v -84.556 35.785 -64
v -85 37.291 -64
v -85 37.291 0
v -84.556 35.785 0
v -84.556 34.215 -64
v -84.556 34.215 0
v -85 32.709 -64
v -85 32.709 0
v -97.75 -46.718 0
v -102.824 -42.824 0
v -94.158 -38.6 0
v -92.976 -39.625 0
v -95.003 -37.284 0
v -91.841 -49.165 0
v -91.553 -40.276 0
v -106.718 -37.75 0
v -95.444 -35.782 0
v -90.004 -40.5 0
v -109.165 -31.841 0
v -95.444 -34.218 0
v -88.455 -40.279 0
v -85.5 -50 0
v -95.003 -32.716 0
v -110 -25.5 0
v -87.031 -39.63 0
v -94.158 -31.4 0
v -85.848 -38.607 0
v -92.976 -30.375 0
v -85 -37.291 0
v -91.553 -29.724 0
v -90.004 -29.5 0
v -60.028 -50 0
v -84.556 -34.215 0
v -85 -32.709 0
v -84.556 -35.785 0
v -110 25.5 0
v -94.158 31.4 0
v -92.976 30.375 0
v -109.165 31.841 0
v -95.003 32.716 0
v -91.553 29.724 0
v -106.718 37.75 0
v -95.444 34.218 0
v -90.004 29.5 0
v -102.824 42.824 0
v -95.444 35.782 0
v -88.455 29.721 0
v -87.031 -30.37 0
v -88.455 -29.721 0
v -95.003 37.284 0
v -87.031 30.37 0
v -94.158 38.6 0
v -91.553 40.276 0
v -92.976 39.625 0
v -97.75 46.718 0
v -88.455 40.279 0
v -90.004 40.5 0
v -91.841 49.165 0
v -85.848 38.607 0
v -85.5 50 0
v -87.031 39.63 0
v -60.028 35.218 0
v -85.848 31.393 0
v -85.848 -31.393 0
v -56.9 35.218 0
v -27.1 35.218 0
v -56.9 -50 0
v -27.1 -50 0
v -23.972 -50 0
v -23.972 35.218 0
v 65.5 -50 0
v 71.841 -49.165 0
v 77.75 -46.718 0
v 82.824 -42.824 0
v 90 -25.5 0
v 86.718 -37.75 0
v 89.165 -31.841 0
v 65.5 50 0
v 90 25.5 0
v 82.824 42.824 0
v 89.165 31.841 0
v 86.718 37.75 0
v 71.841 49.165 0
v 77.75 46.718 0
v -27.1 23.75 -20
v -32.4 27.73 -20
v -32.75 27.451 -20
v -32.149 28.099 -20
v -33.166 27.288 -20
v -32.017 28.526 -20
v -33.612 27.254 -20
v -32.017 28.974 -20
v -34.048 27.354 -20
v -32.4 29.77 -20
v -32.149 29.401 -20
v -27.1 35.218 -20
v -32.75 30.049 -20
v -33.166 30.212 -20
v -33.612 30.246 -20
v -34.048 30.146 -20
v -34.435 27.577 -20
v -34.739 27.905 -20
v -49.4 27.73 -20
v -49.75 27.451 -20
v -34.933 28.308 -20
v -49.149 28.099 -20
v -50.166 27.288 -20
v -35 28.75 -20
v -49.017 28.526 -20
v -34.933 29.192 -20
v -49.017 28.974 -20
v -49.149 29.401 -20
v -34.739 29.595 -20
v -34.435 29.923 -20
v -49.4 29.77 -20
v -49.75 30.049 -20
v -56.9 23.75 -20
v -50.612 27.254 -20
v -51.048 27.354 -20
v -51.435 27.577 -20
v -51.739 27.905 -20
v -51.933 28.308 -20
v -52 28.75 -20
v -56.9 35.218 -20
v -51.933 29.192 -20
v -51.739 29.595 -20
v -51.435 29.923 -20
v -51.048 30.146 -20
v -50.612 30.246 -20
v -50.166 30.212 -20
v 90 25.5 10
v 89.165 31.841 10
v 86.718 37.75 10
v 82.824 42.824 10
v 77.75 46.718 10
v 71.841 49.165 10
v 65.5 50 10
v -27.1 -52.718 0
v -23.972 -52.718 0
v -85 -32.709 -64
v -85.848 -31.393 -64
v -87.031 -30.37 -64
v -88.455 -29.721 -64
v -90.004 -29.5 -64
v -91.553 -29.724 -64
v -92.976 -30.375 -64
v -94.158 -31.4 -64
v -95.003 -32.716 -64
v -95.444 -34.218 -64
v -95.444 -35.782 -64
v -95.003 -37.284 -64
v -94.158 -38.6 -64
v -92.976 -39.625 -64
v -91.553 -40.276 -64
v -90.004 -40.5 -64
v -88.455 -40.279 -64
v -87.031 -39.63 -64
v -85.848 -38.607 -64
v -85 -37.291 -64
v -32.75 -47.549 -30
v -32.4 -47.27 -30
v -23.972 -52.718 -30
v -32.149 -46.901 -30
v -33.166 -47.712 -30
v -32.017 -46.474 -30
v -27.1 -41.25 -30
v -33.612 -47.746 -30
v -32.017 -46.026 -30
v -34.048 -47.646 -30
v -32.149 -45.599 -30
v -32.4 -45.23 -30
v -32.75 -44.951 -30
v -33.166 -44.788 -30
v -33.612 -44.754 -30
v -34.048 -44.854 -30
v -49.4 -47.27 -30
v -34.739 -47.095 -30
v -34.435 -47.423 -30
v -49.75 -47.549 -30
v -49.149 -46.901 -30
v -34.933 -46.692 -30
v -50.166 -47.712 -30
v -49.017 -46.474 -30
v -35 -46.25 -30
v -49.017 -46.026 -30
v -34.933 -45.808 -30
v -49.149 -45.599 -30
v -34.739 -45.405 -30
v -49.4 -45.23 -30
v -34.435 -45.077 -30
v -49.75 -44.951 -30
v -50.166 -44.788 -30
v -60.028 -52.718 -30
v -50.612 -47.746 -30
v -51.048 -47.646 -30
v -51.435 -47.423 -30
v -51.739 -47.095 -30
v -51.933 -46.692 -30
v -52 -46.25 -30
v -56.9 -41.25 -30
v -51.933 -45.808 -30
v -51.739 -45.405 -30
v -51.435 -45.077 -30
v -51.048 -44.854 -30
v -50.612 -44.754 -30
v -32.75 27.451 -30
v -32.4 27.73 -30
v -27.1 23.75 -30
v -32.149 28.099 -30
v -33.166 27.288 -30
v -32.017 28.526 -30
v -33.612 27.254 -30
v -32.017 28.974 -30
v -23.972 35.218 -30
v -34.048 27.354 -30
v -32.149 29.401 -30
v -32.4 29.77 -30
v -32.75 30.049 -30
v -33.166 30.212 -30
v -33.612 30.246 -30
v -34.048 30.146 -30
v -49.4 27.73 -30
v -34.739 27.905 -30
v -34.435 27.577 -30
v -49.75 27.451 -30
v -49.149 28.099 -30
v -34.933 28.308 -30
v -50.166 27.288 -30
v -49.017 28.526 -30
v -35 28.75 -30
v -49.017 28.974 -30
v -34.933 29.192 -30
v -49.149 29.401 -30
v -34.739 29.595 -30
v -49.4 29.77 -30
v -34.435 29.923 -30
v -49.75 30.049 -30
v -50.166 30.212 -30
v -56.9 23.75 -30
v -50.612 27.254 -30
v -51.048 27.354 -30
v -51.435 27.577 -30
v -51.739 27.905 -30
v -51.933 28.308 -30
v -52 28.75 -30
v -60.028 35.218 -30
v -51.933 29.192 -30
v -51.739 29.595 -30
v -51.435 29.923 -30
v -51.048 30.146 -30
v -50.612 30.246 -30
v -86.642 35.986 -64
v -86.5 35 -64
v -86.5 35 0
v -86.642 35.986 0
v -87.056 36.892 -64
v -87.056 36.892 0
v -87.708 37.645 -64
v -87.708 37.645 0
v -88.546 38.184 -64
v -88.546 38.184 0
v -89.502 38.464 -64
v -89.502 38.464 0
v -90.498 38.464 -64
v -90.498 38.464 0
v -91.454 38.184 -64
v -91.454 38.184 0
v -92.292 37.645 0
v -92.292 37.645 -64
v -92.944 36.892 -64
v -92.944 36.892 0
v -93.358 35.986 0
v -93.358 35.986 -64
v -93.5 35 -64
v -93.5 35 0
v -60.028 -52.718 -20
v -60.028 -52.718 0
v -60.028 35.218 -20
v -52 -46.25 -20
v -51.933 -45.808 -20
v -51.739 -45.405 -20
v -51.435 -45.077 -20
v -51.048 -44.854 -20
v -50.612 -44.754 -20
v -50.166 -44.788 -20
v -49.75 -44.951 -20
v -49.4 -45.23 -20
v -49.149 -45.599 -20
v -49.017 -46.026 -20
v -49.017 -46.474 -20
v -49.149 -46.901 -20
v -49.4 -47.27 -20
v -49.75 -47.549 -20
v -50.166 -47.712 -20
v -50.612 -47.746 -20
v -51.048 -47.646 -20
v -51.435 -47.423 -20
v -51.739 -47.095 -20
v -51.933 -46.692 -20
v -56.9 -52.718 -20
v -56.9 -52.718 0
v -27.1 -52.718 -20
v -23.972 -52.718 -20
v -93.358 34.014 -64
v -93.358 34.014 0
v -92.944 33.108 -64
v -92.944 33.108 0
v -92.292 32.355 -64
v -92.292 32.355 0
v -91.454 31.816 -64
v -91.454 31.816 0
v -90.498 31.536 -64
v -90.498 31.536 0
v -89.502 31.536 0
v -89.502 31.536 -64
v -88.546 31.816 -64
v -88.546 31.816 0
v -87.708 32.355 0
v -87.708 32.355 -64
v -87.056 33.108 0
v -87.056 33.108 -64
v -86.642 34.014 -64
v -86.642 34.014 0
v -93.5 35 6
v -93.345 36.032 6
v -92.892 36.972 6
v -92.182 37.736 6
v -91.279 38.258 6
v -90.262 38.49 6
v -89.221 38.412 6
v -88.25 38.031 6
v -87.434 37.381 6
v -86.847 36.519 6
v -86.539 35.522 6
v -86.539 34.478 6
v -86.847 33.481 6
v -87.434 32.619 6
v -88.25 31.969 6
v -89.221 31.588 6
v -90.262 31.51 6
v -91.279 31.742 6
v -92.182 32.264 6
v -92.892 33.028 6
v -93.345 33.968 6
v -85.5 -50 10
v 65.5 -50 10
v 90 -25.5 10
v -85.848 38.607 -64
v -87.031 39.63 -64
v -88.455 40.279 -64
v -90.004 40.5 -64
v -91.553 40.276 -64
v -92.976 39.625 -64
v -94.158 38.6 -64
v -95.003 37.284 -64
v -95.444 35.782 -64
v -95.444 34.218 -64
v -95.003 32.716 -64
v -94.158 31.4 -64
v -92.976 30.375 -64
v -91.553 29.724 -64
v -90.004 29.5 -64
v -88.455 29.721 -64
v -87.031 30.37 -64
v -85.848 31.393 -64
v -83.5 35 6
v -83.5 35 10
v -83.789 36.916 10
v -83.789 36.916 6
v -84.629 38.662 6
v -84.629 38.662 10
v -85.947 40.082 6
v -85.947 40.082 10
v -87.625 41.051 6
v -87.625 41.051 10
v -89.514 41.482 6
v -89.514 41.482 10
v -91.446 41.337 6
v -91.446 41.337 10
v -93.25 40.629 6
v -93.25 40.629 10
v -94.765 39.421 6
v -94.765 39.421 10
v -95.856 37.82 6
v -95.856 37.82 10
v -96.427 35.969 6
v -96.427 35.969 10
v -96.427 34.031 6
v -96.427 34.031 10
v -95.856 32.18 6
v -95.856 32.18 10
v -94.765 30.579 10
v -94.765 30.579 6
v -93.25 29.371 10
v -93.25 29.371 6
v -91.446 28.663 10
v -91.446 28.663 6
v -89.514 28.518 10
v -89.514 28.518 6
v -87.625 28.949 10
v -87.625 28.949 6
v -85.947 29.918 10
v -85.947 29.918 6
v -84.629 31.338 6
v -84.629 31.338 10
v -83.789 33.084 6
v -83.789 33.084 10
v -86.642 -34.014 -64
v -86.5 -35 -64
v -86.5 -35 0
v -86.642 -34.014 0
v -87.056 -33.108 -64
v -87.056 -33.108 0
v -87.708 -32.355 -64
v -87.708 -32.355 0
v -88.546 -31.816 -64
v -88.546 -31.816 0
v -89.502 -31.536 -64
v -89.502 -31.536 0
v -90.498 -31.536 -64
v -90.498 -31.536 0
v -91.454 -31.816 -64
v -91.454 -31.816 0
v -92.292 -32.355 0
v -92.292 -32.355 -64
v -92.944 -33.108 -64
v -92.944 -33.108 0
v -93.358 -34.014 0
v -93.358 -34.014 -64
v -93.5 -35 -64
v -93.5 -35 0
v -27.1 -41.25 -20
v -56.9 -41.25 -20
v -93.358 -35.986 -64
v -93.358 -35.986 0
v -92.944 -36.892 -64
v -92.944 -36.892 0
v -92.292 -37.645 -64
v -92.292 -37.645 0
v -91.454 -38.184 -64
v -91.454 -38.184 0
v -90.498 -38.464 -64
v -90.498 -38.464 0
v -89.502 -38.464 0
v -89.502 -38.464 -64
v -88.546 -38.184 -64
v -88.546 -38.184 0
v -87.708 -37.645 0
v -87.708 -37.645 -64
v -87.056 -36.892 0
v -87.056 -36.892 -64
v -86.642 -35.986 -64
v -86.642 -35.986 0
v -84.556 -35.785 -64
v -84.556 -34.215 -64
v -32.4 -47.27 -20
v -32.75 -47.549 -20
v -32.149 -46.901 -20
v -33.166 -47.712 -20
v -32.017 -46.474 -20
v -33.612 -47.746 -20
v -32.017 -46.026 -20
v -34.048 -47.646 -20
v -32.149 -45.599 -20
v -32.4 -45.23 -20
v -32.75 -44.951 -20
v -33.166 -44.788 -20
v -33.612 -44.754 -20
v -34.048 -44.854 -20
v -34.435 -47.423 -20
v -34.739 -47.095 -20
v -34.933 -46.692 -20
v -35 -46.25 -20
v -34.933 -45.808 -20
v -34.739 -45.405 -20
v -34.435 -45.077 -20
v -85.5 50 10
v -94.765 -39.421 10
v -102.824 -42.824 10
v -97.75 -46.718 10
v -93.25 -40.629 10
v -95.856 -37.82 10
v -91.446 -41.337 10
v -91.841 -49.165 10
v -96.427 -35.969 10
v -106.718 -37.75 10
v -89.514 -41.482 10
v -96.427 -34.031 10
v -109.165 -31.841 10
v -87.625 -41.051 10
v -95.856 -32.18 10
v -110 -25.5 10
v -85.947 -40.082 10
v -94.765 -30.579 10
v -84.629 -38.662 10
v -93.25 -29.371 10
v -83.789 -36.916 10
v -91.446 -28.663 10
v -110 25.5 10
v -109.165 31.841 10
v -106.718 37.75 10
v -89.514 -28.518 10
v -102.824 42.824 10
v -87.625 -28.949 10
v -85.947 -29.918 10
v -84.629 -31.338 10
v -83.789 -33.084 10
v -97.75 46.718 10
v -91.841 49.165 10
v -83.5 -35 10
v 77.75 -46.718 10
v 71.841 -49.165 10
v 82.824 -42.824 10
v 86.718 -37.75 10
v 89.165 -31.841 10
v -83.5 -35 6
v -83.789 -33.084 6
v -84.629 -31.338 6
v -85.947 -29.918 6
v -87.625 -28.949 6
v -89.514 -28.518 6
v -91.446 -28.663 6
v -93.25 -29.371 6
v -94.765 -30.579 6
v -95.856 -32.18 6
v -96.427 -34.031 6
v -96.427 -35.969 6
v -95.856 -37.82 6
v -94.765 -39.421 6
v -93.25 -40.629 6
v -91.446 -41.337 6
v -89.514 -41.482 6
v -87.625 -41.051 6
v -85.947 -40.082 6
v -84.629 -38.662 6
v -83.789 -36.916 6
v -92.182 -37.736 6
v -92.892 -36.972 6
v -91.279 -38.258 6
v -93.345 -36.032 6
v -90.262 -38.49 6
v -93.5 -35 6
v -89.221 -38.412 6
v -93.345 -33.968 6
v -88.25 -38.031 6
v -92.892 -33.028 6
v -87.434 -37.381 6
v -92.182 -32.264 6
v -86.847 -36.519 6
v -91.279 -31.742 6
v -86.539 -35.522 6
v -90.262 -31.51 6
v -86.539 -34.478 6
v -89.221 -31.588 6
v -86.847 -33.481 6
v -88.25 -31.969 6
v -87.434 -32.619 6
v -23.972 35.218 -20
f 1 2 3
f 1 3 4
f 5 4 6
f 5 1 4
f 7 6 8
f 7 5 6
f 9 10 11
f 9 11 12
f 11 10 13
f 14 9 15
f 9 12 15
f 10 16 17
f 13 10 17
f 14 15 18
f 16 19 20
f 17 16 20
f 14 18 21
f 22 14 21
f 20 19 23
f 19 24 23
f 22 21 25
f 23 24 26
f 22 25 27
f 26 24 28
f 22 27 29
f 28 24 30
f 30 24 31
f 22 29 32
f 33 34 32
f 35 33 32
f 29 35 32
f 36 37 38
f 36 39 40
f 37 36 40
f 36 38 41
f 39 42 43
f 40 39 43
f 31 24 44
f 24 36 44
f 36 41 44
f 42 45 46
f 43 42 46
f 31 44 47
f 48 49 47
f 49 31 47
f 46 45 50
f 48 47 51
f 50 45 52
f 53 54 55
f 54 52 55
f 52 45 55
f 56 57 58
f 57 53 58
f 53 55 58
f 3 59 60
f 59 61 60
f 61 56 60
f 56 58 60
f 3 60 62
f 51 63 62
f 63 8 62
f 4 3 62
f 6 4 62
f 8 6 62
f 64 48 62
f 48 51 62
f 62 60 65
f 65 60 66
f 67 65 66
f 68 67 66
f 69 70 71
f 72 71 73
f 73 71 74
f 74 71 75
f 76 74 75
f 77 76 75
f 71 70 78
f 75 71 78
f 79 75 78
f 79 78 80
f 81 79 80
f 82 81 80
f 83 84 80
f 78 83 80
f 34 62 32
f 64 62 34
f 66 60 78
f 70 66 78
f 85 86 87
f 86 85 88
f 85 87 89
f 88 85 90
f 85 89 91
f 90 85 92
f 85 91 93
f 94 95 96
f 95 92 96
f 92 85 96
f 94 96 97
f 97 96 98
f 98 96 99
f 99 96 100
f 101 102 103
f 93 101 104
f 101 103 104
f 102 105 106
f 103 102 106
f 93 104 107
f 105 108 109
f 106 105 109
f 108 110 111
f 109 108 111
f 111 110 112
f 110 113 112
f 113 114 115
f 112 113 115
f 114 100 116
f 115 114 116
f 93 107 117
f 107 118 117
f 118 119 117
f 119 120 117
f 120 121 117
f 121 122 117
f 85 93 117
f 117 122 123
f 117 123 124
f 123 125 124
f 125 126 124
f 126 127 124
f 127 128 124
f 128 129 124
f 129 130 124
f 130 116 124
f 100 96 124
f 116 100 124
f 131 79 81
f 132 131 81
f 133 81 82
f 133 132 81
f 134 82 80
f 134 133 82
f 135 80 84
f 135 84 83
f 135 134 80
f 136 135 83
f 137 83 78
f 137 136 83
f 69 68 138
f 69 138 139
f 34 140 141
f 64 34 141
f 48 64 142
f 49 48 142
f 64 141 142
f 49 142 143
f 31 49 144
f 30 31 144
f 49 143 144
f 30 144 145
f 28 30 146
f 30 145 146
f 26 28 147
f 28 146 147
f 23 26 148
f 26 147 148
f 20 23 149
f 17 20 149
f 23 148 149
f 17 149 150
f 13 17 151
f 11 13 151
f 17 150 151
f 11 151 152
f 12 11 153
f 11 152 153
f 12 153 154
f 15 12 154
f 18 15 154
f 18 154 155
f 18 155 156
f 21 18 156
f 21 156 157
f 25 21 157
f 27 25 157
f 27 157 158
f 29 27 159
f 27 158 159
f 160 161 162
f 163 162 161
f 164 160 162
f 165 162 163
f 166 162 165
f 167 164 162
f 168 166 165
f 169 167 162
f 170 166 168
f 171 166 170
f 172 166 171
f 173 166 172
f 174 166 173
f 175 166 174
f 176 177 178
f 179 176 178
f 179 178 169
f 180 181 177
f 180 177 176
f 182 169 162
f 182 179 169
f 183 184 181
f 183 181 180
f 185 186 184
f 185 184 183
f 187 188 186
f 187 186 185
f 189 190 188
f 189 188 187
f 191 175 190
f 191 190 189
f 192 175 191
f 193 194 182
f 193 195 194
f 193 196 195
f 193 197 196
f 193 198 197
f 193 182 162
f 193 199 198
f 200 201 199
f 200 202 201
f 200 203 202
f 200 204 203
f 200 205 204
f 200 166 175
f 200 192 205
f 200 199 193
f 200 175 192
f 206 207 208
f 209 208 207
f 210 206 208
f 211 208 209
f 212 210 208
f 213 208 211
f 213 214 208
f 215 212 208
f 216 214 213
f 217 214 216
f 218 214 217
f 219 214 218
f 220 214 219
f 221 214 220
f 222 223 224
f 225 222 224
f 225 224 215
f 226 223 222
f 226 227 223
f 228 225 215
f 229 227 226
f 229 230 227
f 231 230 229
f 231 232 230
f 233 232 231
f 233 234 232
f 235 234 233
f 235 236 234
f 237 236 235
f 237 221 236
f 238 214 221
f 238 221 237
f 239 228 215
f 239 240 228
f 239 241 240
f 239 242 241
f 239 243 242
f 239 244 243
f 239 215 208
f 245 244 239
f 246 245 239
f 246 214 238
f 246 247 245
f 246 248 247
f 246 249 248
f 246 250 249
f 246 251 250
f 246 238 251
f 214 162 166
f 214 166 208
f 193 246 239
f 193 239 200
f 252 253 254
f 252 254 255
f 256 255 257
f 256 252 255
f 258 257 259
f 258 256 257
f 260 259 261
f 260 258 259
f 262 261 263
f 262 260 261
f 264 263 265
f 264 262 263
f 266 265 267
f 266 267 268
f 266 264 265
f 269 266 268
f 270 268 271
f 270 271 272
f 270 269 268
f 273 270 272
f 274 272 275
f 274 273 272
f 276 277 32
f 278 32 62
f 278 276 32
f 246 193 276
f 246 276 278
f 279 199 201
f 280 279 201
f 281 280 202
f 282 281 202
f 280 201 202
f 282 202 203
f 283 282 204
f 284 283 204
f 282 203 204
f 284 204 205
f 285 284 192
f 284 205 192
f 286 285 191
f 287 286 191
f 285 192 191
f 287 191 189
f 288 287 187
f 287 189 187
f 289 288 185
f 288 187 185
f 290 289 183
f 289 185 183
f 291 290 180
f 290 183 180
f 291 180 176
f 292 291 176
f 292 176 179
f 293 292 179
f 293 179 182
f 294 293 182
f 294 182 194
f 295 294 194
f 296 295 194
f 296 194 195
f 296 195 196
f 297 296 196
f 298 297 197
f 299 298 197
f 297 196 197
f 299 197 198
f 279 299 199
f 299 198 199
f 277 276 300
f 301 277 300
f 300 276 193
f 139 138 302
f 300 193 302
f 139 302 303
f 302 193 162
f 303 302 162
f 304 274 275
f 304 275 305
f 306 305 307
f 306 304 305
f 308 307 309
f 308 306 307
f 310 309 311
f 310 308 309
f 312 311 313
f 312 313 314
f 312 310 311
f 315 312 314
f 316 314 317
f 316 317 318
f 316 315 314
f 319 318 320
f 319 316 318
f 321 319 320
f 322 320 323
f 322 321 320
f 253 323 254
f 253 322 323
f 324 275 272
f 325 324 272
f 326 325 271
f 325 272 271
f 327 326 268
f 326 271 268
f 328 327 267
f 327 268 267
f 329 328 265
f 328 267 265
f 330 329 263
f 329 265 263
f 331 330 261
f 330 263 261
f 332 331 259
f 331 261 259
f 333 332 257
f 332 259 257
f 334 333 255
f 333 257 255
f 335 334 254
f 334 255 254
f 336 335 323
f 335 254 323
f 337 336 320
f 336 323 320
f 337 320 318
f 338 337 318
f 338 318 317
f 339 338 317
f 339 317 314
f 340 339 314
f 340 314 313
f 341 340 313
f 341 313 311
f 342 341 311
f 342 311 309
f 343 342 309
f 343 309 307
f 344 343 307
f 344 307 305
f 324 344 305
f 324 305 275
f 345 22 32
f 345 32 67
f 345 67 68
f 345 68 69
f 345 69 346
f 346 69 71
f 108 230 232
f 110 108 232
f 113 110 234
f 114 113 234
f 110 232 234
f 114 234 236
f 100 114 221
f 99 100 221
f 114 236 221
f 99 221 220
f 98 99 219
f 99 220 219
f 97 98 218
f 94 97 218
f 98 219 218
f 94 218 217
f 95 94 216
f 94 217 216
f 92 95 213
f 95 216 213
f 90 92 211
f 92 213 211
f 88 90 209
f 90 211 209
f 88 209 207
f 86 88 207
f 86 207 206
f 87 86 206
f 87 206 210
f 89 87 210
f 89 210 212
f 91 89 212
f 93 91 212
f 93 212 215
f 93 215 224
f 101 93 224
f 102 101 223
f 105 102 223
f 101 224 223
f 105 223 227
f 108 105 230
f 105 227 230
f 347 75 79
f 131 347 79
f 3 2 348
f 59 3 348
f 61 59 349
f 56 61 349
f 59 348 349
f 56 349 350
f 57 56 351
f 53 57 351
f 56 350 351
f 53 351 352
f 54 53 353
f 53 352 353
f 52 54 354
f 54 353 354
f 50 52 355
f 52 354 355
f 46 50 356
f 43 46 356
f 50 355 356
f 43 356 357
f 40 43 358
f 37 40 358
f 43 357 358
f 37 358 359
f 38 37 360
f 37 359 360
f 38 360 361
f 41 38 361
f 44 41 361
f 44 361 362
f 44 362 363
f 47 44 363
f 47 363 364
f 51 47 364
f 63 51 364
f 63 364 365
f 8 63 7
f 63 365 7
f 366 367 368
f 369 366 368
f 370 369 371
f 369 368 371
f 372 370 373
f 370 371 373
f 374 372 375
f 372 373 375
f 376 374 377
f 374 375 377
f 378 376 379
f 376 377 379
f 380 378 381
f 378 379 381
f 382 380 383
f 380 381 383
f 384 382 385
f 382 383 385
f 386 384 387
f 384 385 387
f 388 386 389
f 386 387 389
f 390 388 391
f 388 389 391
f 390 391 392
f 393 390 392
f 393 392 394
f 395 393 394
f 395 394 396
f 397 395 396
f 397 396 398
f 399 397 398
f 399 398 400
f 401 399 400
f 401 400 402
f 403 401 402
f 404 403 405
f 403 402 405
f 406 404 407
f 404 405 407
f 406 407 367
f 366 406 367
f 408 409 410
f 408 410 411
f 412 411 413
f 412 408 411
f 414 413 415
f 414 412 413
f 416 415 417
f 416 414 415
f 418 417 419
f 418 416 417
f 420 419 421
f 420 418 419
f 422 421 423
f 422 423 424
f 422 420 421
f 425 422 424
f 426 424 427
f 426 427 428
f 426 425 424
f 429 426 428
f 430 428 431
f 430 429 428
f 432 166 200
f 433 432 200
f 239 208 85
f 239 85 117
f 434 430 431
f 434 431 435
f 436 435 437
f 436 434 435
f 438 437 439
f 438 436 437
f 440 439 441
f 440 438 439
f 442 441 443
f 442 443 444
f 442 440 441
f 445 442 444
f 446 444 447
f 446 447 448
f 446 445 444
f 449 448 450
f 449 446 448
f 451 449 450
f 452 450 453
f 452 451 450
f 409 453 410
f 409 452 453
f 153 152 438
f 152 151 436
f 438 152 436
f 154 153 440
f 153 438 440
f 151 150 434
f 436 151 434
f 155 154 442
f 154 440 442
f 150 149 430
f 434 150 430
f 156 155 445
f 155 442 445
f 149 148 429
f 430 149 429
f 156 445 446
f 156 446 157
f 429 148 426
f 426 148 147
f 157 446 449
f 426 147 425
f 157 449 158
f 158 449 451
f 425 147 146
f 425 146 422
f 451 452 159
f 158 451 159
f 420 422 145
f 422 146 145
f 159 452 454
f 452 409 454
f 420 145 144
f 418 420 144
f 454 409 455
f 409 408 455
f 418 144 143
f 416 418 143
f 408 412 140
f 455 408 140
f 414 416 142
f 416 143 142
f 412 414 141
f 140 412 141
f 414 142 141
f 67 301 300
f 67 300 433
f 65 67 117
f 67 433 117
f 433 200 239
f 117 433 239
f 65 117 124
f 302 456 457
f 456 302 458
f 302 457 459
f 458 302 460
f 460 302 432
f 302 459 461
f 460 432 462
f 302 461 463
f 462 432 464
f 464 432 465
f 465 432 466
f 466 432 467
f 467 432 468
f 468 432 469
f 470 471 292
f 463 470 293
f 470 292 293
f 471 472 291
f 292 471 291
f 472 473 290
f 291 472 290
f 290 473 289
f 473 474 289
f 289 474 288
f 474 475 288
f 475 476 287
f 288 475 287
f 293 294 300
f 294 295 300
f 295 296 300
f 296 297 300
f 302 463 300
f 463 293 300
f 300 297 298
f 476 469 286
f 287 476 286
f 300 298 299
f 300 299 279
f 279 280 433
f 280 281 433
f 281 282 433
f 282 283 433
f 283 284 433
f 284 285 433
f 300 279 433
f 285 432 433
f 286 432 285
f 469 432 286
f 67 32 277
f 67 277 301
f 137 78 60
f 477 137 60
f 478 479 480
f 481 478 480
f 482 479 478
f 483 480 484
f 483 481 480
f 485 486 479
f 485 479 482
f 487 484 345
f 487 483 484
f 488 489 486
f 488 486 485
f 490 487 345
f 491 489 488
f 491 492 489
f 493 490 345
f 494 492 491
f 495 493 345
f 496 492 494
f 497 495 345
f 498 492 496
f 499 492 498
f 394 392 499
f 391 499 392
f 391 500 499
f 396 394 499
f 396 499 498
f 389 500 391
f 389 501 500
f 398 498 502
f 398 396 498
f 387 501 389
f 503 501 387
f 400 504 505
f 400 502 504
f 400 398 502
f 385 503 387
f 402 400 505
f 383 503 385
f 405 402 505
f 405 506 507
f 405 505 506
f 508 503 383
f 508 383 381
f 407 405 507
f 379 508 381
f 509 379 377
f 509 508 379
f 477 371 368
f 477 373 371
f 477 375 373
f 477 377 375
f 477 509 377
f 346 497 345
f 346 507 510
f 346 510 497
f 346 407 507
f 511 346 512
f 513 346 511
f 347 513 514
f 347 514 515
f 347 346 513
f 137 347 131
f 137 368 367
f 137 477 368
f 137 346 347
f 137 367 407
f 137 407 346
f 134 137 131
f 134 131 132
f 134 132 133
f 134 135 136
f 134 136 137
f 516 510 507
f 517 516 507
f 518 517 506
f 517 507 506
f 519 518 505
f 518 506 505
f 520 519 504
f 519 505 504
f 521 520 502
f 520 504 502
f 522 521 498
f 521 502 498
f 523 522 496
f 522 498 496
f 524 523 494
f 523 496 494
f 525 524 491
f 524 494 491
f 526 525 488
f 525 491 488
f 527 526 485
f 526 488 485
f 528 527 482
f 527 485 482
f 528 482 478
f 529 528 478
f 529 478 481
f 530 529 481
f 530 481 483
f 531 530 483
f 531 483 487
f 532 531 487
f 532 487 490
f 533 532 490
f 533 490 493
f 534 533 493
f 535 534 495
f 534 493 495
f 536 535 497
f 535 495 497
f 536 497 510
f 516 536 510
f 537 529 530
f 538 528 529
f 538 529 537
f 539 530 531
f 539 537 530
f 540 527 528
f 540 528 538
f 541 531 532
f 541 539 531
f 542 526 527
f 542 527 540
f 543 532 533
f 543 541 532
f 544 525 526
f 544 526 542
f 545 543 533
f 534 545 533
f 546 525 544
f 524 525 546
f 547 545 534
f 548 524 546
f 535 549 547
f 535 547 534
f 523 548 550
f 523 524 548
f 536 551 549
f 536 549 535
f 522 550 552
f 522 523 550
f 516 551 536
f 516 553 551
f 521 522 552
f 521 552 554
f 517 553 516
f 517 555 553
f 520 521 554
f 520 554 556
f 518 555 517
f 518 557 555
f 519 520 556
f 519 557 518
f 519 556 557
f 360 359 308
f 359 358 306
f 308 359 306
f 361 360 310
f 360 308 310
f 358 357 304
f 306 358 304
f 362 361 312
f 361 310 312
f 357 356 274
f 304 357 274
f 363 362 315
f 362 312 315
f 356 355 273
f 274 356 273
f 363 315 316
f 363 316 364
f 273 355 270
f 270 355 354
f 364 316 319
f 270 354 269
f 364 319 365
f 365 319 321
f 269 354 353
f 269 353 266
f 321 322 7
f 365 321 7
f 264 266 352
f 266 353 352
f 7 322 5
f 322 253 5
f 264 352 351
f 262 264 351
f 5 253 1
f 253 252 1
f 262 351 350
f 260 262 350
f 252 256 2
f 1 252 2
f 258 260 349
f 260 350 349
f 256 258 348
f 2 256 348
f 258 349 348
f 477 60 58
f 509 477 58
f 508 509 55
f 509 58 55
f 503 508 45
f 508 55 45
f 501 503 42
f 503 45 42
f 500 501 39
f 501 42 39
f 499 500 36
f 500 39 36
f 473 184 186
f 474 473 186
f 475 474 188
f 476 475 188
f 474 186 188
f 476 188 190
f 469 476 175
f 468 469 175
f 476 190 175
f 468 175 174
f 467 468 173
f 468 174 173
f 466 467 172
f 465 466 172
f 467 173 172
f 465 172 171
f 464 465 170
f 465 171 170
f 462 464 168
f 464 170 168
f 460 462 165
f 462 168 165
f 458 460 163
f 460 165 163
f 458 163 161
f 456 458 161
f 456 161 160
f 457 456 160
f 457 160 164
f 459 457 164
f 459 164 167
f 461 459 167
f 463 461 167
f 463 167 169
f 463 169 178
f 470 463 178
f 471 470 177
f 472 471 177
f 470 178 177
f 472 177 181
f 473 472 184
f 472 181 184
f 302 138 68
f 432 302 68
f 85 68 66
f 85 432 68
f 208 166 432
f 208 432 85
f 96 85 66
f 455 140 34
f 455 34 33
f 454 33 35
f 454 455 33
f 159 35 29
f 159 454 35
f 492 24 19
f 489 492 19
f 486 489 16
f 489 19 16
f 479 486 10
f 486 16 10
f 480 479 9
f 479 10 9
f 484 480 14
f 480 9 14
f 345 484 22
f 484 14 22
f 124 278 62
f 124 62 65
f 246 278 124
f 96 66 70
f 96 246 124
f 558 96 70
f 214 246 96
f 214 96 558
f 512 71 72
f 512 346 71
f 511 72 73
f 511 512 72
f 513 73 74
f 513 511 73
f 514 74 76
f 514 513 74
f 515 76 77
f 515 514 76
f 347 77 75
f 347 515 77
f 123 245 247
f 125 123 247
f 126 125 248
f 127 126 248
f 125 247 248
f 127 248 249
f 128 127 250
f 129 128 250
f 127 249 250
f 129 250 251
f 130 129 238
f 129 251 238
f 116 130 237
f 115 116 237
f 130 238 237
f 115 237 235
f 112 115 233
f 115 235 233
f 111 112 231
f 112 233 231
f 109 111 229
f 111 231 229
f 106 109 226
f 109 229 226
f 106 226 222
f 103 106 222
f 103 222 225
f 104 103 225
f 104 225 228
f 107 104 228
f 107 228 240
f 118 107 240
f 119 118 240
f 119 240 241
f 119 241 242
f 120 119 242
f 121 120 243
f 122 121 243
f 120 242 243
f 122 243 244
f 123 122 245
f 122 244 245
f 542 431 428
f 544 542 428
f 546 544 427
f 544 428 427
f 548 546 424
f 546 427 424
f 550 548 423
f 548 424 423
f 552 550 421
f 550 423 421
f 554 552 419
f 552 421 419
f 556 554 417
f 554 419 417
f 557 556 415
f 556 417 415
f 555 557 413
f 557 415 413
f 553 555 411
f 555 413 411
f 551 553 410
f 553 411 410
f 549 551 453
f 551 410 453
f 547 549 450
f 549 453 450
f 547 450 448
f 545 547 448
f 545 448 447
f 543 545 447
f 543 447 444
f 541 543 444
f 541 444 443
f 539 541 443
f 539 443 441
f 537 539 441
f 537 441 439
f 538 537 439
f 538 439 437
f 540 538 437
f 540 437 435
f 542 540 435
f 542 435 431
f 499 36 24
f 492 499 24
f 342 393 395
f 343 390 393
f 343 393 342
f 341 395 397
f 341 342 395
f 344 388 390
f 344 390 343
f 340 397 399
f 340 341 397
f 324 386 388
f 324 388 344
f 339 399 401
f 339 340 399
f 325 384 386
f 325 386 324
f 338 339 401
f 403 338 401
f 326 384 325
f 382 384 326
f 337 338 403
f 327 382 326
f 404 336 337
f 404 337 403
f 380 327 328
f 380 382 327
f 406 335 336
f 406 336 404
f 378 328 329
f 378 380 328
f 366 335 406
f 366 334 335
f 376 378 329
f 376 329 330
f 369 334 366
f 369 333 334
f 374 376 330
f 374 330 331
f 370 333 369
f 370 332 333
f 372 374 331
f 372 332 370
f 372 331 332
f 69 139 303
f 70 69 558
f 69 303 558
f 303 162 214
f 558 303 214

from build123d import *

# Parameters (mm, degrees)
SKETCH1_W              = 180
SKETCH1_H              = 100
BOSS_EXTRUDE1_DEPTH    = 10
FILLET1_R              = 24.5
SKETCH5_R              = 5.5
SKETCH5_R_2            = 3.5
BOSS_EXTRUDE4_DEPTH    = 64
MOVE_FACE2_DEPTH       = 10
MOVE_START             = -64
MOVE_FACE3_OUTLINE_R   = 3.5
MOVE_FACE3_DEPTH       = 64
MOVE_FACE3_2_DEPTH     = 10
MOVE_FACE3_3_OUTLINE_R = 3.5
MOVE_FACE3_3_DEPTH     = 64
SKETCH7_R              = 3.5
CUT_EXTRUDE2_DEPTH     = 74
SKETCH8_R              = 6.5
CUT_EXTRUDE3_DEPTH     = 4
SKETCH9_W              = 36.05660051
SKETCH9_H              = 87.936885764
SKETCH9_R              = 1.5
SKETCH9_W_2            = 29.8
SKETCH9_H_2            = 65
BOSS_EXTRUDE6_DEPTH    = 10
SKETCH10_W             = 3.128300255
SKETCH10_H             = 87.936885764
BOSS_EXTRUDE7_DEPTH    = 20


# Read off the part's stored shape, not the designer's step: Move Face2, Move Face3
with BuildPart() as part:
    # Sketch1 → Boss-Extrude1 (new body)
    with BuildSketch(Plane.XY):
        Rectangle(SKETCH1_W, SKETCH1_H)
    extrude(amount=BOSS_EXTRUDE1_DEPTH)

    # Fillet1
    fillet1_edges = [part.edges().sort_by_distance(p)[0] for p in [
        (90, -50, 5),
        (-90, -50, 5),
        (-90, 50, 5),
        (90, 50, 5),
    ]]
    fillet(fillet1_edges, radius=FILLET1_R)

    # Sketch5 → Boss-Extrude4 (add)
    # profile 1 of 2: a face of its own
    with BuildSketch(Plane(origin=(0, 0, 0), x_dir=(-1, 0, 0), z_dir=(0, 0, -1))):
        with Locations((80, 35)):
            Circle(SKETCH5_R)
        with Locations((80, 35)):
            Circle(SKETCH5_R_2, mode=Mode.SUBTRACT)
    # profile 2 of 2: a face of its own
    with BuildSketch(Plane(origin=(0, 0, 0), x_dir=(-1, 0, 0), z_dir=(0, 0, -1))):
        with Locations((80, -35)):
            Circle(SKETCH5_R)
        with Locations((80, -35)):
            Circle(SKETCH5_R_2, mode=Mode.SUBTRACT)
    extrude(amount=BOSS_EXTRUDE4_DEPTH)

    # Move Face2 outline → Move Face2 (add)
    with BuildSketch(Plane.XY):
        with BuildLine():
            Line((-100, 25.5), (-100, -25.5))
            ThreePointArc((-100, -25.5), (-92.824116139, -42.824116139), (-75.5, -50))
            Line((-75.5, -50), (-65.5, -50))
            ThreePointArc((-65.5, -50), (-82.824116139, -42.824116139), (-90, -25.5))
            Line((-90, -25.5), (-90, 25.5))
            ThreePointArc((-90, 25.5), (-82.824116139, 42.824116139), (-65.5, 50))
            Line((-65.5, 50), (-75.5, 50))
            ThreePointArc((-75.5, 50), (-92.824116139, 42.824116139), (-100, 25.5))
        make_face()
    extrude(amount=MOVE_FACE2_DEPTH)

    # Move Face3 outline → Move Face3 (cut)
    # profile 1 of 2: a face of its own
    with BuildSketch(Plane.XY.offset(MOVE_START)):
        with BuildLine():
            ThreePointArc((-85, 37.291287847), (-84.5, 35), (-85, 32.708712153))
            ThreePointArc((-85, 32.708712153), (-74.5, 35), (-85, 37.291287847))
        make_face()
        with Locations((-80, 35)):
            Circle(MOVE_FACE3_OUTLINE_R, mode=Mode.SUBTRACT)
    # profile 2 of 2: a face of its own
    with BuildSketch(Plane.XY.offset(MOVE_START)):
        with BuildLine():
            ThreePointArc((-85, -32.708712153), (-84.5, -35), (-85, -37.291287847))
            ThreePointArc((-85, -37.291287847), (-74.5, -35), (-85, -32.708712153))
        make_face()
        with Locations((-80, -35)):
            Circle(MOVE_FACE3_OUTLINE_R, mode=Mode.SUBTRACT)
    extrude(amount=MOVE_FACE3_DEPTH, mode=Mode.SUBTRACT)

    # Move Face3 2 outline → Move Face3 2 (add)
    with BuildSketch(Plane.XY):
        with BuildLine():
            Line((-110, 25.5), (-110, -25.5))
            ThreePointArc((-110, -25.5), (-102.824116139, -42.824116139), (-85.5, -50))
            Line((-85.5, -50), (-75.5, -50))
            ThreePointArc((-75.5, -50), (-92.824116139, -42.824116139), (-100, -25.5))
            Line((-100, -25.5), (-100, 25.5))
            ThreePointArc((-100, 25.5), (-92.824116139, 42.824116139), (-75.5, 50))
            Line((-75.5, 50), (-85.5, 50))
            ThreePointArc((-85.5, 50), (-102.824116139, 42.824116139), (-110, 25.5))
        make_face()
    extrude(amount=MOVE_FACE3_2_DEPTH)

    # Move Face3 3 outline → Move Face3 3 (add)
    # profile 1 of 2: a face of its own
    with BuildSketch(Plane.XY.offset(MOVE_START)):
        with BuildLine():
            ThreePointArc((-85, 32.708712153), (-85.5, 35), (-85, 37.291287847))
            ThreePointArc((-85, 37.291287847), (-95.5, 35), (-85, 32.708712153))
        make_face()
        with Locations((-90, 35)):
            Circle(MOVE_FACE3_3_OUTLINE_R, mode=Mode.SUBTRACT)
    # profile 2 of 2: a face of its own
    with BuildSketch(Plane.XY.offset(MOVE_START)):
        with BuildLine():
            ThreePointArc((-85, -37.291287847), (-85.5, -35), (-85, -32.708712153))
            ThreePointArc((-85, -32.708712153), (-95.5, -35), (-85, -37.291287847))
        make_face()
        with Locations((-90, -35)):
            Circle(MOVE_FACE3_3_OUTLINE_R, mode=Mode.SUBTRACT)
    extrude(amount=MOVE_FACE3_3_DEPTH)

    # Sketch7 → Cut-Extrude2 (cut)
    with BuildSketch(Plane(origin=(0, 0, -64), x_dir=(-1, 0, 0), z_dir=(0, 0, -1))):
        with Locations((90, -35)):
            Circle(SKETCH7_R)
        with Locations((90, 35)):
            Circle(SKETCH7_R)
    extrude(amount=-CUT_EXTRUDE2_DEPTH, mode=Mode.SUBTRACT)

    # Sketch8 → Cut-Extrude3 (cut)
    with BuildSketch(Plane.XY.offset(10)):
        with Locations((-90, 35)):
            Circle(SKETCH8_R)
        with Locations((-90, -35)):
            Circle(SKETCH8_R)
    extrude(amount=-CUT_EXTRUDE3_DEPTH, mode=Mode.SUBTRACT)



with BuildPart() as body_2:
    # Sketch9 → Boss-Extrude6 (new body)
    with BuildSketch(Plane(origin=(0, 0, -30), x_dir=(-1, 0, 0), z_dir=(0, 0, -1))):
        with Locations((42, -8.75)):
            Rectangle(SKETCH9_W, SKETCH9_H)
        with Locations((33.5, 28.75)):
            Circle(SKETCH9_R, mode=Mode.SUBTRACT)
        with Locations((50.5, 28.75)):
            Circle(SKETCH9_R, mode=Mode.SUBTRACT)
        with Locations((50.5, -46.25)):
            Circle(SKETCH9_R, mode=Mode.SUBTRACT)
        with Locations((33.5, -46.25)):
            Circle(SKETCH9_R, mode=Mode.SUBTRACT)
        with Locations((42, -8.75)):
            Rectangle(SKETCH9_W_2, SKETCH9_H_2, mode=Mode.SUBTRACT)
    extrude(amount=-BOSS_EXTRUDE6_DEPTH)


with BuildPart() as part_1:
    add(part.part)

    add(body_2.part)  # Boss-Extrude7 merges body 2
    # Sketch10 → Boss-Extrude7 (add)
    with BuildSketch(Plane.XY.offset(-20)):
        with Locations((-25.535849873, -8.75)):
            Rectangle(SKETCH10_W, SKETCH10_H)
        with Locations((-58.464150128, -8.75)):
            Rectangle(SKETCH10_W, SKETCH10_H)
    extrude(amount=BOSS_EXTRUDE7_DEPTH)


solid = part_1.part
